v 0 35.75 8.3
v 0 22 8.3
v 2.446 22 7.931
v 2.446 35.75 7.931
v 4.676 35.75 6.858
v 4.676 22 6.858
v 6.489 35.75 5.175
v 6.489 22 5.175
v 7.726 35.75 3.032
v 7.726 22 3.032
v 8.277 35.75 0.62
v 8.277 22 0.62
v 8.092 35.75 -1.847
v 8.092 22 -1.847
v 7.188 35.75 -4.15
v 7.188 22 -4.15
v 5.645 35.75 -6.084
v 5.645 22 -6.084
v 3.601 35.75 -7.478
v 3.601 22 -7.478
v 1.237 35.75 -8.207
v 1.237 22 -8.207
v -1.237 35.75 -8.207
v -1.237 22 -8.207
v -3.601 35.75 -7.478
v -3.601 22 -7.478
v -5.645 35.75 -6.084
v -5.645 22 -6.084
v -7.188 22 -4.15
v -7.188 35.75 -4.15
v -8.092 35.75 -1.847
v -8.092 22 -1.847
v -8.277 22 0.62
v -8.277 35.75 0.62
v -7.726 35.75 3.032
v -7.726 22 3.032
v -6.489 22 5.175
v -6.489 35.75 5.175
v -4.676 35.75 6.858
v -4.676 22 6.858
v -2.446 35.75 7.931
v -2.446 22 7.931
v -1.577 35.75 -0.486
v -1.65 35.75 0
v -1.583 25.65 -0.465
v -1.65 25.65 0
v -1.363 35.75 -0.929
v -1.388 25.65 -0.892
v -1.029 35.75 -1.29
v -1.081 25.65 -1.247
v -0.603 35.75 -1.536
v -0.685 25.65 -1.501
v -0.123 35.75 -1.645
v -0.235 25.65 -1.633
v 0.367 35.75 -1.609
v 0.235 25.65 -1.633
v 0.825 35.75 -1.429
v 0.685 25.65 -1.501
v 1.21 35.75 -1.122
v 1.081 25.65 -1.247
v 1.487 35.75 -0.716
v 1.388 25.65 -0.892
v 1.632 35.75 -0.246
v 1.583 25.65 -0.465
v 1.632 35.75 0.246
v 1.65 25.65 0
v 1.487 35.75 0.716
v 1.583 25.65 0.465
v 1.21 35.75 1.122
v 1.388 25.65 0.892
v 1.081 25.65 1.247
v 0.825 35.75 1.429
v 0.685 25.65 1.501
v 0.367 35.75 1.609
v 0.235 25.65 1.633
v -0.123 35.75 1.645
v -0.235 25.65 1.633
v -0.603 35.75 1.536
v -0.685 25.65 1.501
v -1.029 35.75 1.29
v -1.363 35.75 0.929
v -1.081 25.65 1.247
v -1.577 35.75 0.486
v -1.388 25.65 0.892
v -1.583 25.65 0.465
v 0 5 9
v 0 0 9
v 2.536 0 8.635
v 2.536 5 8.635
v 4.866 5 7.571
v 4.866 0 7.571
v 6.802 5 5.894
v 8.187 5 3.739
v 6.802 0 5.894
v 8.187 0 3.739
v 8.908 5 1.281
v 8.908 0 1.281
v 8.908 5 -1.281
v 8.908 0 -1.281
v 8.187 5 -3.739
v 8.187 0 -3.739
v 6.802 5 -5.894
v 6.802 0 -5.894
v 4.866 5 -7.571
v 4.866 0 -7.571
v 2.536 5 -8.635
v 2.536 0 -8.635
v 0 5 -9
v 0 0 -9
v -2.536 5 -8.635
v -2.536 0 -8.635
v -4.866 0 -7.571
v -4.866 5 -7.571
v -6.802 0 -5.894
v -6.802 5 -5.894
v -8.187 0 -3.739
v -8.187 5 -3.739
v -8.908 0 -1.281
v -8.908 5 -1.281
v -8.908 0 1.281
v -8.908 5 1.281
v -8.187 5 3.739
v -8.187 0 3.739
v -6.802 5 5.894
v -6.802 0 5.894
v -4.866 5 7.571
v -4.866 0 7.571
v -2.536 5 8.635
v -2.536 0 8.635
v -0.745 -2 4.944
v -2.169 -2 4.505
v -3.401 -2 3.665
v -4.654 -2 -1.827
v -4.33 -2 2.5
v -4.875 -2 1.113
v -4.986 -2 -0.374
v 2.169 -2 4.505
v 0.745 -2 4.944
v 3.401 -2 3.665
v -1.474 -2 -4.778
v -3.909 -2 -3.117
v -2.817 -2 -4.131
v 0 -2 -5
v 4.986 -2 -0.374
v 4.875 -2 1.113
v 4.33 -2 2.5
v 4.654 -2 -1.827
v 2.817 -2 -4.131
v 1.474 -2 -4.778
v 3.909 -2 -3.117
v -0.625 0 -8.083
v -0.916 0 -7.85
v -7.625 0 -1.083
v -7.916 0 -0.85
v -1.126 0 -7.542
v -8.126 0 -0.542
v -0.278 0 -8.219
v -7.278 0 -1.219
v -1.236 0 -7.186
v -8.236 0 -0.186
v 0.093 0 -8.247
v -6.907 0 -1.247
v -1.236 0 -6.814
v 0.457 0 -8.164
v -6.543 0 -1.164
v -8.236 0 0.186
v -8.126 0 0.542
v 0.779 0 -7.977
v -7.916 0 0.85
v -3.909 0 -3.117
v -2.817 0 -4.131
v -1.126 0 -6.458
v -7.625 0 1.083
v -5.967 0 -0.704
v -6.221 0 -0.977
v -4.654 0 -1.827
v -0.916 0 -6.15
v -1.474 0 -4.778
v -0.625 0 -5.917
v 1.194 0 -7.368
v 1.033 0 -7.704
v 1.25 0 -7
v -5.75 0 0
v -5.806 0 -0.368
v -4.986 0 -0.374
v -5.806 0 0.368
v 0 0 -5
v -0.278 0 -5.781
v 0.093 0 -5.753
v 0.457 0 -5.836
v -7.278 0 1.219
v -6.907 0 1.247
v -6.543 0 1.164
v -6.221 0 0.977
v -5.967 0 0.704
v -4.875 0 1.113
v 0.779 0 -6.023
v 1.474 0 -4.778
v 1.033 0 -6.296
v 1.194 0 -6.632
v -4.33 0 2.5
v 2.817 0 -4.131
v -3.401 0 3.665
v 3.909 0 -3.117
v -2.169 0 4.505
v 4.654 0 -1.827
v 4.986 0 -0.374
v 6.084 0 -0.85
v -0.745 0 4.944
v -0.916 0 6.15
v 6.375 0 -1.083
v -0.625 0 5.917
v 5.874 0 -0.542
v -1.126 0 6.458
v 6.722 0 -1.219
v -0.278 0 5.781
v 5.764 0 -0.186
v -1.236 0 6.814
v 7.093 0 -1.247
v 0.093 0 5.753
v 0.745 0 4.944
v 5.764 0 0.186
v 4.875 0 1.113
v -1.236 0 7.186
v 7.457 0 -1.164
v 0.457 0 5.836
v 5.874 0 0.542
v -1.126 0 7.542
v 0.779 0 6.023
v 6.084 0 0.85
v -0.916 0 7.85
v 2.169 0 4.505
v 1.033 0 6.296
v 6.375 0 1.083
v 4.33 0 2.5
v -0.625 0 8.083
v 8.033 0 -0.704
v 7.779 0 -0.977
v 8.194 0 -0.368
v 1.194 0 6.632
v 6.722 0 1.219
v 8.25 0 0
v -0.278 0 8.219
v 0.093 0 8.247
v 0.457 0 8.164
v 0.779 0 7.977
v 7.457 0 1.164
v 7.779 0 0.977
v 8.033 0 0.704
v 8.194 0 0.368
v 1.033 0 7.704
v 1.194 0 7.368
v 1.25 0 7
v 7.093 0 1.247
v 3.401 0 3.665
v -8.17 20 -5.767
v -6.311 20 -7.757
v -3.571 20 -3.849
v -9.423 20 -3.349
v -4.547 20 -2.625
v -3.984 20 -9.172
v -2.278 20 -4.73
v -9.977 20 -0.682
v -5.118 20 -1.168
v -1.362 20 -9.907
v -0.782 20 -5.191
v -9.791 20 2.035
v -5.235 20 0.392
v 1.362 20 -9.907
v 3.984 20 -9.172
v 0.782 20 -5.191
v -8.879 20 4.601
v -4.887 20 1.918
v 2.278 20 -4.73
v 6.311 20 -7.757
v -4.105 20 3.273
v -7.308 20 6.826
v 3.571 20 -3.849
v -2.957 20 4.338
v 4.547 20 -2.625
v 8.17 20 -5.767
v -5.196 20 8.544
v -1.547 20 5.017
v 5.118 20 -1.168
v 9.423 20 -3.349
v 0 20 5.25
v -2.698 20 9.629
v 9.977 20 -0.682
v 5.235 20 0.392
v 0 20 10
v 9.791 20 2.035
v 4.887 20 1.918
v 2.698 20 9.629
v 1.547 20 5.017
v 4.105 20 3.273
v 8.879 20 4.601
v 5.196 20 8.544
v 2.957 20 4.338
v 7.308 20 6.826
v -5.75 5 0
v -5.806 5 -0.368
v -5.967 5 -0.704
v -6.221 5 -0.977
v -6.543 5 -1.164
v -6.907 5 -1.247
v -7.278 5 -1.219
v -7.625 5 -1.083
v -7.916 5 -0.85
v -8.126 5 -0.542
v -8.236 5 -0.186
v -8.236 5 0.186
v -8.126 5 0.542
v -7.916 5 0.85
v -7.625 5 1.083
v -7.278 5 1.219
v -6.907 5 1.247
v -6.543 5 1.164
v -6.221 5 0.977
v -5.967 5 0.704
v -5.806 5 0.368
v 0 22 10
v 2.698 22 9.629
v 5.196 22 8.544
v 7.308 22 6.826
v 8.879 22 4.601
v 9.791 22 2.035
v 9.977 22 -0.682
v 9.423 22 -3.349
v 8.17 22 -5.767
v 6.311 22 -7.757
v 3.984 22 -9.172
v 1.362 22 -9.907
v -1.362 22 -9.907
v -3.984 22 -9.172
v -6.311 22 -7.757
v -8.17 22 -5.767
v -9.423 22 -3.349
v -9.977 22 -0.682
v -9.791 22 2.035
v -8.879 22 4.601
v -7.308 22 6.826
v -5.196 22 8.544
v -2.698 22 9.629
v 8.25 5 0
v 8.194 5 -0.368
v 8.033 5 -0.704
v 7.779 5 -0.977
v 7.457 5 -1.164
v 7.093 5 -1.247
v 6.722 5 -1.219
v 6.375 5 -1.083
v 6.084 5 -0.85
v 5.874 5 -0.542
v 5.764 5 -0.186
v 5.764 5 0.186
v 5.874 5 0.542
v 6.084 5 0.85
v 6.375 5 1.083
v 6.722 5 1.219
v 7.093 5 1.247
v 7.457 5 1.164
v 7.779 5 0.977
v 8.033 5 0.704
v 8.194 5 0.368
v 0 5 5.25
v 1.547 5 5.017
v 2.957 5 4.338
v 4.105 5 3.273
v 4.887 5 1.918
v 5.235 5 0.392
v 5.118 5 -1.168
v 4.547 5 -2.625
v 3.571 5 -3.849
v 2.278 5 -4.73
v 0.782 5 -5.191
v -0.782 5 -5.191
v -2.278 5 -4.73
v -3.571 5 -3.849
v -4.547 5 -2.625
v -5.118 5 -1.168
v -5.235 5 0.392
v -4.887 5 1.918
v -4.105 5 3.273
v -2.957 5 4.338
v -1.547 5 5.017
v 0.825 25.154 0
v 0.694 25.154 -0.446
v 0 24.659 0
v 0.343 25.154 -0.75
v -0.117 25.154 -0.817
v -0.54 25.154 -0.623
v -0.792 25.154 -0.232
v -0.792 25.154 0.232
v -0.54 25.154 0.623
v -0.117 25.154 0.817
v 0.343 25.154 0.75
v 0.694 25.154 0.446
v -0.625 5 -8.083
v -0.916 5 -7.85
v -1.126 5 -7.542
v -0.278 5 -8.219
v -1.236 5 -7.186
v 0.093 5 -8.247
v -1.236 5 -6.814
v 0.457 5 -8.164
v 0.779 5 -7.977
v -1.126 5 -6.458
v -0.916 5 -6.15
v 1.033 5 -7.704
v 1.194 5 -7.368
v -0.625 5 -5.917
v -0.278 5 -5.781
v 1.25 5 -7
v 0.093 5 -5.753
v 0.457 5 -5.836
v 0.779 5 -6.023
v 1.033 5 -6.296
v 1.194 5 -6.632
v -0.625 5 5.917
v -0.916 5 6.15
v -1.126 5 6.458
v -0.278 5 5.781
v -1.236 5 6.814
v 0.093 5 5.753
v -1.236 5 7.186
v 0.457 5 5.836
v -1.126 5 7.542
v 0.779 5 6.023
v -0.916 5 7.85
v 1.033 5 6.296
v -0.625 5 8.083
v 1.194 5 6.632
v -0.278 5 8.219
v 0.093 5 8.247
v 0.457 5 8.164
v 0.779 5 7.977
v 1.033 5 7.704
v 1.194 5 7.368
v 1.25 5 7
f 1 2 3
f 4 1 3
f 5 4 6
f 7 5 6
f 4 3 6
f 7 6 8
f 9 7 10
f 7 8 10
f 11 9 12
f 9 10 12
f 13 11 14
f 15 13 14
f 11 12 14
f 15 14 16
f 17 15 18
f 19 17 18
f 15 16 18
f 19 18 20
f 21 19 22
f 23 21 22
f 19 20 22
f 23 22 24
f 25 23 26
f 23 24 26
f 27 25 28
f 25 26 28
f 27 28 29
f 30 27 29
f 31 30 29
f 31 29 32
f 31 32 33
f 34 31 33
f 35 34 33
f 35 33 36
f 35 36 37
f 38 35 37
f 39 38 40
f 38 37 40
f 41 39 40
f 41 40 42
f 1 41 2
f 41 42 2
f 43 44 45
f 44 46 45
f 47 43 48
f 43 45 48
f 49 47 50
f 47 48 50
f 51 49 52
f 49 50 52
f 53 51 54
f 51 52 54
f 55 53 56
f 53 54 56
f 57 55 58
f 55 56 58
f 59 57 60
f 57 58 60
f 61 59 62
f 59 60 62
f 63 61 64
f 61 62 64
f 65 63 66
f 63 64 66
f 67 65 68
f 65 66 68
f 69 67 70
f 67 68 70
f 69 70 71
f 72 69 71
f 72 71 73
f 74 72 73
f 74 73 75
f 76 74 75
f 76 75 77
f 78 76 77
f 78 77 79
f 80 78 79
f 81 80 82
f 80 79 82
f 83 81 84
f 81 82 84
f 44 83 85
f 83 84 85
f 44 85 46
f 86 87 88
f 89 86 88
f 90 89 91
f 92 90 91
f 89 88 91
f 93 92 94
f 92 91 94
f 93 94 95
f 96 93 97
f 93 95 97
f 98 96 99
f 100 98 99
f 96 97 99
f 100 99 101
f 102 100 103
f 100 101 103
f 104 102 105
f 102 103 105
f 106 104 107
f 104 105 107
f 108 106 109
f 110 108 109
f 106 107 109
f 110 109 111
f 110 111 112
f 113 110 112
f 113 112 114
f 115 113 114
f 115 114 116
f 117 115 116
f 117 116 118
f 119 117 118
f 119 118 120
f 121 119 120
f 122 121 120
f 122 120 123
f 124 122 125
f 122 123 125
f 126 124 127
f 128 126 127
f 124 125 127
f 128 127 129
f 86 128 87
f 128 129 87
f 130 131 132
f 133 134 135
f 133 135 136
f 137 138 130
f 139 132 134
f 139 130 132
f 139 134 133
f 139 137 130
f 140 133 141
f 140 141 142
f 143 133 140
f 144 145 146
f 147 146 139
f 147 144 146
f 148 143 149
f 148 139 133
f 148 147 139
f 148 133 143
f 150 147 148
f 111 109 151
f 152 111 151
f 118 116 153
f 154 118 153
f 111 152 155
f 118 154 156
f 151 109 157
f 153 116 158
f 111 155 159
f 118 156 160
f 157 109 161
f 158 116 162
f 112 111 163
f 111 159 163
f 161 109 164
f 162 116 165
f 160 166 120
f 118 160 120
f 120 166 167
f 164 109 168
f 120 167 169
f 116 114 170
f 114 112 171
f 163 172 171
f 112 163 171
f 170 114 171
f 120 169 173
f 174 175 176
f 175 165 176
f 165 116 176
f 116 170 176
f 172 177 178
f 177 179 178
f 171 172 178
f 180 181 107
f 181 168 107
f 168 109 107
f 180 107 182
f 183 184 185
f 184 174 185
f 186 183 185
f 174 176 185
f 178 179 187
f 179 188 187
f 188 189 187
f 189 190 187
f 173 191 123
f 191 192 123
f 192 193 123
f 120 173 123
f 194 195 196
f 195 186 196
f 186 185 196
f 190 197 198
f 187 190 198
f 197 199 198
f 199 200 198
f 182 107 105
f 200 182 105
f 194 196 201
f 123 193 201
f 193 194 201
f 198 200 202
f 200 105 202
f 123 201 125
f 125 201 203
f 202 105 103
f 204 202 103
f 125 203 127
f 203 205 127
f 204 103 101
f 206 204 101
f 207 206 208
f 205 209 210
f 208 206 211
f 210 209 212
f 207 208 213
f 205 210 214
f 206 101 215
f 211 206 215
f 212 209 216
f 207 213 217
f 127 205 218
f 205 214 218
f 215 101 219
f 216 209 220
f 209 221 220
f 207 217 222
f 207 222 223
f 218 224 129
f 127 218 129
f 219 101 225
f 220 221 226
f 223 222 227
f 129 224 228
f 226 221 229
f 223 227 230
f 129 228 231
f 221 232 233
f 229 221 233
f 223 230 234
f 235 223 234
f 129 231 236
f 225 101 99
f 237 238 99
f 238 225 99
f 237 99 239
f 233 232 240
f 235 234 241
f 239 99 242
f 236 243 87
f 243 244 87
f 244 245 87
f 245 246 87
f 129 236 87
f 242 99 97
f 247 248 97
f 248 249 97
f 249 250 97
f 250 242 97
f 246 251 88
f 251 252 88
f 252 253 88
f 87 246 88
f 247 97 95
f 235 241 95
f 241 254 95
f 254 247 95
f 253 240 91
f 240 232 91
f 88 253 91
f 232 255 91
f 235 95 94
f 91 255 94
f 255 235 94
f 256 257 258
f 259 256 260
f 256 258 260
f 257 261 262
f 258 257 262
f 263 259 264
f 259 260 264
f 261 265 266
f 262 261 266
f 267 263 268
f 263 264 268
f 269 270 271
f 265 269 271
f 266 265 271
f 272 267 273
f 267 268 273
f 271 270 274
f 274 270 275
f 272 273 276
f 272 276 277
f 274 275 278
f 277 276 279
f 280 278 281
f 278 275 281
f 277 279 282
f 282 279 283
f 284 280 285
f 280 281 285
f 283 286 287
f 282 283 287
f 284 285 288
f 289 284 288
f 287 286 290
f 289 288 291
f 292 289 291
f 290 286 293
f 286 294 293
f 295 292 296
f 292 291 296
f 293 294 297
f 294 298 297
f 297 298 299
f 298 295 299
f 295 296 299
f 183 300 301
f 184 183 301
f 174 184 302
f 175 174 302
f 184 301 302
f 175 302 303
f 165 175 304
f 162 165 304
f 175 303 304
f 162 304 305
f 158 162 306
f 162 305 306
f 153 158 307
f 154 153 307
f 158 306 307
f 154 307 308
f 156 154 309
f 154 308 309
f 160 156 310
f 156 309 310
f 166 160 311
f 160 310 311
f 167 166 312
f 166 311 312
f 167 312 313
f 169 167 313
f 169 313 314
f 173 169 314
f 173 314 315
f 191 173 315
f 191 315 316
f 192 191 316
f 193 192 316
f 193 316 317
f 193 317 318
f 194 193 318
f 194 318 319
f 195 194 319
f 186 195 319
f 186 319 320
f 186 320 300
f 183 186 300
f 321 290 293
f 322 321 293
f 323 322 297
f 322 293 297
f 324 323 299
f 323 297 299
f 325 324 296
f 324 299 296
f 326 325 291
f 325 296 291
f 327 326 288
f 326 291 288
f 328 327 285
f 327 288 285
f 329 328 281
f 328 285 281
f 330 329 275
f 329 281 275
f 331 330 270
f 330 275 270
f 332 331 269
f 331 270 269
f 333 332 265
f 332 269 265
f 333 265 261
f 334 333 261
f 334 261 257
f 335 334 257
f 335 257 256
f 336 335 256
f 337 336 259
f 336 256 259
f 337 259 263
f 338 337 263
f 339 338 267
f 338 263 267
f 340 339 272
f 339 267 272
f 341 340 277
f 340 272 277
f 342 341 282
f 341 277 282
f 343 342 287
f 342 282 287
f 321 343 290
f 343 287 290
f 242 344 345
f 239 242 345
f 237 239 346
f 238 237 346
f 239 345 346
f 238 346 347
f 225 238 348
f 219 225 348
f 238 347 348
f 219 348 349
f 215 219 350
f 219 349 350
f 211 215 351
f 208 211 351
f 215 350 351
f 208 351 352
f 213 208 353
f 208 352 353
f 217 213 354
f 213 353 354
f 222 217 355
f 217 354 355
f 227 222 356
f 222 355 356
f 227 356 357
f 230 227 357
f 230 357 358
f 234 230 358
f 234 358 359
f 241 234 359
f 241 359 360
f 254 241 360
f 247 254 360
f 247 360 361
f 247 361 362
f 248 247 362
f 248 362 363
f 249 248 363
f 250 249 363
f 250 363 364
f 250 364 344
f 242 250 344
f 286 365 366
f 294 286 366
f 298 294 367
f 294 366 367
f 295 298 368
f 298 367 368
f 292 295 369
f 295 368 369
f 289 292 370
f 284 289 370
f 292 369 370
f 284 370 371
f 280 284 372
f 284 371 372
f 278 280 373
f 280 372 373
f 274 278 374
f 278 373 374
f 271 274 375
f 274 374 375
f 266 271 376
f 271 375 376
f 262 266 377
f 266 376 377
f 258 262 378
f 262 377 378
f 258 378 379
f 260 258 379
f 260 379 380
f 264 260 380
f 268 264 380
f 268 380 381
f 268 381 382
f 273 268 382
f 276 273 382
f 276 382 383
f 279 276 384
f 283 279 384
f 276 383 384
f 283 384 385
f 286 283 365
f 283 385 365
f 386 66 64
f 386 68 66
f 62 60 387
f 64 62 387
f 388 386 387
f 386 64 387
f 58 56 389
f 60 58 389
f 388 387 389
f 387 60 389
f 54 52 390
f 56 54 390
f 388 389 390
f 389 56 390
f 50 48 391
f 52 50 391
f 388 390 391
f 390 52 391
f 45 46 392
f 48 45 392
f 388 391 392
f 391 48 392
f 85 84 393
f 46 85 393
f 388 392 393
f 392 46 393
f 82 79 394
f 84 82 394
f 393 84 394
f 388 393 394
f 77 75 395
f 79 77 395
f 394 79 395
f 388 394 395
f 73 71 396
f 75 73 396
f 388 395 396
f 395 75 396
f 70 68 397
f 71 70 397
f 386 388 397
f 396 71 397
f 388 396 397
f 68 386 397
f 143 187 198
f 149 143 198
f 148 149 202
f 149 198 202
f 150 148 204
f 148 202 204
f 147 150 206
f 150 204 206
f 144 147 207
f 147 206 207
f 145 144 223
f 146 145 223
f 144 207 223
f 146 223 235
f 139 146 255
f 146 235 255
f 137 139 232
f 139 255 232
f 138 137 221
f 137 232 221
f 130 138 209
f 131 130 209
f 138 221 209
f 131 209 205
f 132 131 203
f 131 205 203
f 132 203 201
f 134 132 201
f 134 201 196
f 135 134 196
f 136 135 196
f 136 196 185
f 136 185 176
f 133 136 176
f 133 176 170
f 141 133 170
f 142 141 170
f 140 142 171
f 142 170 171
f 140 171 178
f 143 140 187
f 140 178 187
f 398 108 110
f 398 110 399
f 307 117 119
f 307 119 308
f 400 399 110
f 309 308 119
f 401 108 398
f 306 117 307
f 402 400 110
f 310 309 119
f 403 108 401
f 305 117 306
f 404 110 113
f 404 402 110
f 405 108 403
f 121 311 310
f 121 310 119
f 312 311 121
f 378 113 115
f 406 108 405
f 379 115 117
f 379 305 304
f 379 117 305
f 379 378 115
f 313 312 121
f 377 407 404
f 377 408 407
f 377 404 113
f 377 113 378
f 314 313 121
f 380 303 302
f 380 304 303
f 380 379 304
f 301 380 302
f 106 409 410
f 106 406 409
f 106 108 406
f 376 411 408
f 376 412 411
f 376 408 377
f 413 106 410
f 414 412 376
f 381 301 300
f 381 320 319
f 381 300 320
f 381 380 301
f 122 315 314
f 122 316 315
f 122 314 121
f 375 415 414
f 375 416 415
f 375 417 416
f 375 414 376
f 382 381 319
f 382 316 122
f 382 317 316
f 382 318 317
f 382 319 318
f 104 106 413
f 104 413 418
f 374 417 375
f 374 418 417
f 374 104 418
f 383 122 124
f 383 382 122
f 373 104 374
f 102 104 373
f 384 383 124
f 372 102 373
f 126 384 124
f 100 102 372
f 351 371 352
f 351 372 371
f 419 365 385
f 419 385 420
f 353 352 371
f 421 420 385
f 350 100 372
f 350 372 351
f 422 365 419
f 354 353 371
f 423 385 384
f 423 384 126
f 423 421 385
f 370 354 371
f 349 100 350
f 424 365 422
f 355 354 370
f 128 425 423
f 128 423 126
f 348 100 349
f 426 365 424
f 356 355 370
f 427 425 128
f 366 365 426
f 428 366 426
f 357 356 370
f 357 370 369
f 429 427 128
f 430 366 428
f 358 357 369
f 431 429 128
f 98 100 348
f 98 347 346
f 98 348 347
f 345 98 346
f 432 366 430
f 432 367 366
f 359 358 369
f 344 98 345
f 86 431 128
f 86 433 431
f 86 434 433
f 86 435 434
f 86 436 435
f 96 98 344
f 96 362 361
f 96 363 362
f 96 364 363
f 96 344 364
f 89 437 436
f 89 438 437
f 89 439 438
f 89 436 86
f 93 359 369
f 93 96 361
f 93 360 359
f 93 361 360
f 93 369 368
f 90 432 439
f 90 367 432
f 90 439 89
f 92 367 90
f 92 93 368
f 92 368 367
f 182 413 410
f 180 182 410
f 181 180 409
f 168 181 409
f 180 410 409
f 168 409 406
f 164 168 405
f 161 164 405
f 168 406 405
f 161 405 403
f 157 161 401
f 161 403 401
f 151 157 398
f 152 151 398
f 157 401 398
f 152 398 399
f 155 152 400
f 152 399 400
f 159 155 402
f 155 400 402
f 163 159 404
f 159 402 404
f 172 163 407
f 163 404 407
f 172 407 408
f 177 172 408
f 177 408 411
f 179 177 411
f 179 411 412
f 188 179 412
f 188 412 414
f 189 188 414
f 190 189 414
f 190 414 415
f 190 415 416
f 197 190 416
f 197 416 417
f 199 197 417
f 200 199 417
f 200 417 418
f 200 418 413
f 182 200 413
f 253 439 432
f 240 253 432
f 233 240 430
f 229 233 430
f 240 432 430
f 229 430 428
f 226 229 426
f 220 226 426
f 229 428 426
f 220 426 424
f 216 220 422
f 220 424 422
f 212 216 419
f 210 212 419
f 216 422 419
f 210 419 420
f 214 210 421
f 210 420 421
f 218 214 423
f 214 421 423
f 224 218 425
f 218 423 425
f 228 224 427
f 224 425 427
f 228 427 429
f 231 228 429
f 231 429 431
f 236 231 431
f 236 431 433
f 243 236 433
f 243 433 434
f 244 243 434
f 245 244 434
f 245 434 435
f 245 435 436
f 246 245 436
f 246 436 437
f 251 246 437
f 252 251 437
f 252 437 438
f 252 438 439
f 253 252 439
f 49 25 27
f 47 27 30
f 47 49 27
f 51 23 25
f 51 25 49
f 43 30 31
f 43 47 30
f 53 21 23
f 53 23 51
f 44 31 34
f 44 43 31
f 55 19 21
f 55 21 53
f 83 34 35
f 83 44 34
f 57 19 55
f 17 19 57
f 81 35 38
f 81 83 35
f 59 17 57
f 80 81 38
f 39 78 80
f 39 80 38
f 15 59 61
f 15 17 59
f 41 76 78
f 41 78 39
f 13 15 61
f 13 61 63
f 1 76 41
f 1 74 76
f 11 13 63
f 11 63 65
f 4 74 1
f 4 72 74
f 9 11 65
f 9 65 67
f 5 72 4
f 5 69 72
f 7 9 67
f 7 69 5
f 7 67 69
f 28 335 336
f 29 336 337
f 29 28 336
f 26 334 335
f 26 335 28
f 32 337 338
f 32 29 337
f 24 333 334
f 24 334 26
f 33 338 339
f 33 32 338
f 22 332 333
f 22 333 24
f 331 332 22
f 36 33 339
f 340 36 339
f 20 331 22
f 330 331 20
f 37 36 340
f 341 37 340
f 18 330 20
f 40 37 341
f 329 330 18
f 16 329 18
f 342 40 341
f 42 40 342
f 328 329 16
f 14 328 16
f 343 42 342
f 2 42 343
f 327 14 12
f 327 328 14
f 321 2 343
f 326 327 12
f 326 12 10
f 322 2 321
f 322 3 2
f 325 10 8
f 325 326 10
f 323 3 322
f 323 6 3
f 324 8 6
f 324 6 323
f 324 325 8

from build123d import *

# Parameters (mm, degrees)
SKETCH_1_R             = 9
EXTRUDE_1_DEPTH        = 5
SKETCH_3_R             = 5.25
EXTRUDE_2_DEPTH        = 15
SKETCH_4_R             = 10
EXTRUDE_4_DEPTH        = 2
SKETCH_5_R             = 8.3
EXTRUDE_5_DEPTH        = 13.75
HOLE_WIZARD_M3_1_D     = 2.5
HOLE_WIZARD_M3_1_DEPTH = 5
SKETCH_8_R             = 5
EXTRUDE_6_DEPTH        = 2
HOLE_WIZARD_M4_3_D     = 3.3
HOLE_WIZARD_M4_3_DEPTH = 10.1
HOLE_WIZARD_M4_3_TIP   = 0.991420021


with BuildPart() as part:
    # 草图1 → 凸台-拉伸1 (new body)
    with BuildSketch(Plane(origin=(0, 0, 0), x_dir=(1, 0, 0), z_dir=(0, 1, 0))):
        with Locations(Location((0, 0, 0), (0, 0, 270))):
            Circle(SKETCH_1_R)
    extrude(amount=EXTRUDE_1_DEPTH)

    # 草图3 → 凸台-拉伸2 (add)
    with BuildSketch(Plane(origin=(0, 5, 0), x_dir=(1, 0, 0), z_dir=(0, 1, 0))):
        with Locations(Location((0, 0, 0), (0, 0, 270))):
            Circle(SKETCH_3_R)
    extrude(amount=EXTRUDE_2_DEPTH)

    # 草图4 → 凸台-拉伸4 (add)
    with BuildSketch(Plane(origin=(0, 20, 0), x_dir=(1, 0, 0), z_dir=(0, 1, 0))):
        with Locations(Location((0, 0, 0), (0, 0, 270))):
            Circle(SKETCH_4_R)
    extrude(amount=EXTRUDE_4_DEPTH)

    # 草图5 → 凸台-拉伸5 (add)
    with BuildSketch(Plane(origin=(0, 22, 0), x_dir=(1, 0, 0), z_dir=(0, 1, 0))):
        with Locations(Location((0, 0, 0), (0, 0, 270))):
            Circle(SKETCH_5_R)
    extrude(amount=EXTRUDE_5_DEPTH)

    # M3 螺纹孔1
    with Locations(Plane(origin=(0, 0, 0), x_dir=(-1, 0, 0), z_dir=(0, -1, 0))):
        with Locations((0, 7), (-7, 0), (7, 0), (0, -7)):
            Hole(HOLE_WIZARD_M3_1_D / 2, depth=HOLE_WIZARD_M3_1_DEPTH)

    # 草图8 → 凸台-拉伸6 (add)
    with BuildSketch(Plane.XZ):
        with Locations(Location((0, 0, 0), (0, 0, 270))):
            Circle(SKETCH_8_R)
    extrude(amount=EXTRUDE_6_DEPTH)

    # M4 螺纹孔3
    with Locations(Plane(origin=(0, 35.75, 0), x_dir=(1, 0, 0), z_dir=(0, 1, 0))):
        with Locations((0, 0)):
            Hole(HOLE_WIZARD_M4_3_D / 2, depth=HOLE_WIZARD_M4_3_DEPTH)
            with Locations((0, 0, -(HOLE_WIZARD_M4_3_DEPTH + HOLE_WIZARD_M4_3_TIP / 2))):  # 118° drill point
                Cone(0, HOLE_WIZARD_M4_3_D / 2, HOLE_WIZARD_M4_3_TIP, mode=Mode.SUBTRACT)


solid = part.part
